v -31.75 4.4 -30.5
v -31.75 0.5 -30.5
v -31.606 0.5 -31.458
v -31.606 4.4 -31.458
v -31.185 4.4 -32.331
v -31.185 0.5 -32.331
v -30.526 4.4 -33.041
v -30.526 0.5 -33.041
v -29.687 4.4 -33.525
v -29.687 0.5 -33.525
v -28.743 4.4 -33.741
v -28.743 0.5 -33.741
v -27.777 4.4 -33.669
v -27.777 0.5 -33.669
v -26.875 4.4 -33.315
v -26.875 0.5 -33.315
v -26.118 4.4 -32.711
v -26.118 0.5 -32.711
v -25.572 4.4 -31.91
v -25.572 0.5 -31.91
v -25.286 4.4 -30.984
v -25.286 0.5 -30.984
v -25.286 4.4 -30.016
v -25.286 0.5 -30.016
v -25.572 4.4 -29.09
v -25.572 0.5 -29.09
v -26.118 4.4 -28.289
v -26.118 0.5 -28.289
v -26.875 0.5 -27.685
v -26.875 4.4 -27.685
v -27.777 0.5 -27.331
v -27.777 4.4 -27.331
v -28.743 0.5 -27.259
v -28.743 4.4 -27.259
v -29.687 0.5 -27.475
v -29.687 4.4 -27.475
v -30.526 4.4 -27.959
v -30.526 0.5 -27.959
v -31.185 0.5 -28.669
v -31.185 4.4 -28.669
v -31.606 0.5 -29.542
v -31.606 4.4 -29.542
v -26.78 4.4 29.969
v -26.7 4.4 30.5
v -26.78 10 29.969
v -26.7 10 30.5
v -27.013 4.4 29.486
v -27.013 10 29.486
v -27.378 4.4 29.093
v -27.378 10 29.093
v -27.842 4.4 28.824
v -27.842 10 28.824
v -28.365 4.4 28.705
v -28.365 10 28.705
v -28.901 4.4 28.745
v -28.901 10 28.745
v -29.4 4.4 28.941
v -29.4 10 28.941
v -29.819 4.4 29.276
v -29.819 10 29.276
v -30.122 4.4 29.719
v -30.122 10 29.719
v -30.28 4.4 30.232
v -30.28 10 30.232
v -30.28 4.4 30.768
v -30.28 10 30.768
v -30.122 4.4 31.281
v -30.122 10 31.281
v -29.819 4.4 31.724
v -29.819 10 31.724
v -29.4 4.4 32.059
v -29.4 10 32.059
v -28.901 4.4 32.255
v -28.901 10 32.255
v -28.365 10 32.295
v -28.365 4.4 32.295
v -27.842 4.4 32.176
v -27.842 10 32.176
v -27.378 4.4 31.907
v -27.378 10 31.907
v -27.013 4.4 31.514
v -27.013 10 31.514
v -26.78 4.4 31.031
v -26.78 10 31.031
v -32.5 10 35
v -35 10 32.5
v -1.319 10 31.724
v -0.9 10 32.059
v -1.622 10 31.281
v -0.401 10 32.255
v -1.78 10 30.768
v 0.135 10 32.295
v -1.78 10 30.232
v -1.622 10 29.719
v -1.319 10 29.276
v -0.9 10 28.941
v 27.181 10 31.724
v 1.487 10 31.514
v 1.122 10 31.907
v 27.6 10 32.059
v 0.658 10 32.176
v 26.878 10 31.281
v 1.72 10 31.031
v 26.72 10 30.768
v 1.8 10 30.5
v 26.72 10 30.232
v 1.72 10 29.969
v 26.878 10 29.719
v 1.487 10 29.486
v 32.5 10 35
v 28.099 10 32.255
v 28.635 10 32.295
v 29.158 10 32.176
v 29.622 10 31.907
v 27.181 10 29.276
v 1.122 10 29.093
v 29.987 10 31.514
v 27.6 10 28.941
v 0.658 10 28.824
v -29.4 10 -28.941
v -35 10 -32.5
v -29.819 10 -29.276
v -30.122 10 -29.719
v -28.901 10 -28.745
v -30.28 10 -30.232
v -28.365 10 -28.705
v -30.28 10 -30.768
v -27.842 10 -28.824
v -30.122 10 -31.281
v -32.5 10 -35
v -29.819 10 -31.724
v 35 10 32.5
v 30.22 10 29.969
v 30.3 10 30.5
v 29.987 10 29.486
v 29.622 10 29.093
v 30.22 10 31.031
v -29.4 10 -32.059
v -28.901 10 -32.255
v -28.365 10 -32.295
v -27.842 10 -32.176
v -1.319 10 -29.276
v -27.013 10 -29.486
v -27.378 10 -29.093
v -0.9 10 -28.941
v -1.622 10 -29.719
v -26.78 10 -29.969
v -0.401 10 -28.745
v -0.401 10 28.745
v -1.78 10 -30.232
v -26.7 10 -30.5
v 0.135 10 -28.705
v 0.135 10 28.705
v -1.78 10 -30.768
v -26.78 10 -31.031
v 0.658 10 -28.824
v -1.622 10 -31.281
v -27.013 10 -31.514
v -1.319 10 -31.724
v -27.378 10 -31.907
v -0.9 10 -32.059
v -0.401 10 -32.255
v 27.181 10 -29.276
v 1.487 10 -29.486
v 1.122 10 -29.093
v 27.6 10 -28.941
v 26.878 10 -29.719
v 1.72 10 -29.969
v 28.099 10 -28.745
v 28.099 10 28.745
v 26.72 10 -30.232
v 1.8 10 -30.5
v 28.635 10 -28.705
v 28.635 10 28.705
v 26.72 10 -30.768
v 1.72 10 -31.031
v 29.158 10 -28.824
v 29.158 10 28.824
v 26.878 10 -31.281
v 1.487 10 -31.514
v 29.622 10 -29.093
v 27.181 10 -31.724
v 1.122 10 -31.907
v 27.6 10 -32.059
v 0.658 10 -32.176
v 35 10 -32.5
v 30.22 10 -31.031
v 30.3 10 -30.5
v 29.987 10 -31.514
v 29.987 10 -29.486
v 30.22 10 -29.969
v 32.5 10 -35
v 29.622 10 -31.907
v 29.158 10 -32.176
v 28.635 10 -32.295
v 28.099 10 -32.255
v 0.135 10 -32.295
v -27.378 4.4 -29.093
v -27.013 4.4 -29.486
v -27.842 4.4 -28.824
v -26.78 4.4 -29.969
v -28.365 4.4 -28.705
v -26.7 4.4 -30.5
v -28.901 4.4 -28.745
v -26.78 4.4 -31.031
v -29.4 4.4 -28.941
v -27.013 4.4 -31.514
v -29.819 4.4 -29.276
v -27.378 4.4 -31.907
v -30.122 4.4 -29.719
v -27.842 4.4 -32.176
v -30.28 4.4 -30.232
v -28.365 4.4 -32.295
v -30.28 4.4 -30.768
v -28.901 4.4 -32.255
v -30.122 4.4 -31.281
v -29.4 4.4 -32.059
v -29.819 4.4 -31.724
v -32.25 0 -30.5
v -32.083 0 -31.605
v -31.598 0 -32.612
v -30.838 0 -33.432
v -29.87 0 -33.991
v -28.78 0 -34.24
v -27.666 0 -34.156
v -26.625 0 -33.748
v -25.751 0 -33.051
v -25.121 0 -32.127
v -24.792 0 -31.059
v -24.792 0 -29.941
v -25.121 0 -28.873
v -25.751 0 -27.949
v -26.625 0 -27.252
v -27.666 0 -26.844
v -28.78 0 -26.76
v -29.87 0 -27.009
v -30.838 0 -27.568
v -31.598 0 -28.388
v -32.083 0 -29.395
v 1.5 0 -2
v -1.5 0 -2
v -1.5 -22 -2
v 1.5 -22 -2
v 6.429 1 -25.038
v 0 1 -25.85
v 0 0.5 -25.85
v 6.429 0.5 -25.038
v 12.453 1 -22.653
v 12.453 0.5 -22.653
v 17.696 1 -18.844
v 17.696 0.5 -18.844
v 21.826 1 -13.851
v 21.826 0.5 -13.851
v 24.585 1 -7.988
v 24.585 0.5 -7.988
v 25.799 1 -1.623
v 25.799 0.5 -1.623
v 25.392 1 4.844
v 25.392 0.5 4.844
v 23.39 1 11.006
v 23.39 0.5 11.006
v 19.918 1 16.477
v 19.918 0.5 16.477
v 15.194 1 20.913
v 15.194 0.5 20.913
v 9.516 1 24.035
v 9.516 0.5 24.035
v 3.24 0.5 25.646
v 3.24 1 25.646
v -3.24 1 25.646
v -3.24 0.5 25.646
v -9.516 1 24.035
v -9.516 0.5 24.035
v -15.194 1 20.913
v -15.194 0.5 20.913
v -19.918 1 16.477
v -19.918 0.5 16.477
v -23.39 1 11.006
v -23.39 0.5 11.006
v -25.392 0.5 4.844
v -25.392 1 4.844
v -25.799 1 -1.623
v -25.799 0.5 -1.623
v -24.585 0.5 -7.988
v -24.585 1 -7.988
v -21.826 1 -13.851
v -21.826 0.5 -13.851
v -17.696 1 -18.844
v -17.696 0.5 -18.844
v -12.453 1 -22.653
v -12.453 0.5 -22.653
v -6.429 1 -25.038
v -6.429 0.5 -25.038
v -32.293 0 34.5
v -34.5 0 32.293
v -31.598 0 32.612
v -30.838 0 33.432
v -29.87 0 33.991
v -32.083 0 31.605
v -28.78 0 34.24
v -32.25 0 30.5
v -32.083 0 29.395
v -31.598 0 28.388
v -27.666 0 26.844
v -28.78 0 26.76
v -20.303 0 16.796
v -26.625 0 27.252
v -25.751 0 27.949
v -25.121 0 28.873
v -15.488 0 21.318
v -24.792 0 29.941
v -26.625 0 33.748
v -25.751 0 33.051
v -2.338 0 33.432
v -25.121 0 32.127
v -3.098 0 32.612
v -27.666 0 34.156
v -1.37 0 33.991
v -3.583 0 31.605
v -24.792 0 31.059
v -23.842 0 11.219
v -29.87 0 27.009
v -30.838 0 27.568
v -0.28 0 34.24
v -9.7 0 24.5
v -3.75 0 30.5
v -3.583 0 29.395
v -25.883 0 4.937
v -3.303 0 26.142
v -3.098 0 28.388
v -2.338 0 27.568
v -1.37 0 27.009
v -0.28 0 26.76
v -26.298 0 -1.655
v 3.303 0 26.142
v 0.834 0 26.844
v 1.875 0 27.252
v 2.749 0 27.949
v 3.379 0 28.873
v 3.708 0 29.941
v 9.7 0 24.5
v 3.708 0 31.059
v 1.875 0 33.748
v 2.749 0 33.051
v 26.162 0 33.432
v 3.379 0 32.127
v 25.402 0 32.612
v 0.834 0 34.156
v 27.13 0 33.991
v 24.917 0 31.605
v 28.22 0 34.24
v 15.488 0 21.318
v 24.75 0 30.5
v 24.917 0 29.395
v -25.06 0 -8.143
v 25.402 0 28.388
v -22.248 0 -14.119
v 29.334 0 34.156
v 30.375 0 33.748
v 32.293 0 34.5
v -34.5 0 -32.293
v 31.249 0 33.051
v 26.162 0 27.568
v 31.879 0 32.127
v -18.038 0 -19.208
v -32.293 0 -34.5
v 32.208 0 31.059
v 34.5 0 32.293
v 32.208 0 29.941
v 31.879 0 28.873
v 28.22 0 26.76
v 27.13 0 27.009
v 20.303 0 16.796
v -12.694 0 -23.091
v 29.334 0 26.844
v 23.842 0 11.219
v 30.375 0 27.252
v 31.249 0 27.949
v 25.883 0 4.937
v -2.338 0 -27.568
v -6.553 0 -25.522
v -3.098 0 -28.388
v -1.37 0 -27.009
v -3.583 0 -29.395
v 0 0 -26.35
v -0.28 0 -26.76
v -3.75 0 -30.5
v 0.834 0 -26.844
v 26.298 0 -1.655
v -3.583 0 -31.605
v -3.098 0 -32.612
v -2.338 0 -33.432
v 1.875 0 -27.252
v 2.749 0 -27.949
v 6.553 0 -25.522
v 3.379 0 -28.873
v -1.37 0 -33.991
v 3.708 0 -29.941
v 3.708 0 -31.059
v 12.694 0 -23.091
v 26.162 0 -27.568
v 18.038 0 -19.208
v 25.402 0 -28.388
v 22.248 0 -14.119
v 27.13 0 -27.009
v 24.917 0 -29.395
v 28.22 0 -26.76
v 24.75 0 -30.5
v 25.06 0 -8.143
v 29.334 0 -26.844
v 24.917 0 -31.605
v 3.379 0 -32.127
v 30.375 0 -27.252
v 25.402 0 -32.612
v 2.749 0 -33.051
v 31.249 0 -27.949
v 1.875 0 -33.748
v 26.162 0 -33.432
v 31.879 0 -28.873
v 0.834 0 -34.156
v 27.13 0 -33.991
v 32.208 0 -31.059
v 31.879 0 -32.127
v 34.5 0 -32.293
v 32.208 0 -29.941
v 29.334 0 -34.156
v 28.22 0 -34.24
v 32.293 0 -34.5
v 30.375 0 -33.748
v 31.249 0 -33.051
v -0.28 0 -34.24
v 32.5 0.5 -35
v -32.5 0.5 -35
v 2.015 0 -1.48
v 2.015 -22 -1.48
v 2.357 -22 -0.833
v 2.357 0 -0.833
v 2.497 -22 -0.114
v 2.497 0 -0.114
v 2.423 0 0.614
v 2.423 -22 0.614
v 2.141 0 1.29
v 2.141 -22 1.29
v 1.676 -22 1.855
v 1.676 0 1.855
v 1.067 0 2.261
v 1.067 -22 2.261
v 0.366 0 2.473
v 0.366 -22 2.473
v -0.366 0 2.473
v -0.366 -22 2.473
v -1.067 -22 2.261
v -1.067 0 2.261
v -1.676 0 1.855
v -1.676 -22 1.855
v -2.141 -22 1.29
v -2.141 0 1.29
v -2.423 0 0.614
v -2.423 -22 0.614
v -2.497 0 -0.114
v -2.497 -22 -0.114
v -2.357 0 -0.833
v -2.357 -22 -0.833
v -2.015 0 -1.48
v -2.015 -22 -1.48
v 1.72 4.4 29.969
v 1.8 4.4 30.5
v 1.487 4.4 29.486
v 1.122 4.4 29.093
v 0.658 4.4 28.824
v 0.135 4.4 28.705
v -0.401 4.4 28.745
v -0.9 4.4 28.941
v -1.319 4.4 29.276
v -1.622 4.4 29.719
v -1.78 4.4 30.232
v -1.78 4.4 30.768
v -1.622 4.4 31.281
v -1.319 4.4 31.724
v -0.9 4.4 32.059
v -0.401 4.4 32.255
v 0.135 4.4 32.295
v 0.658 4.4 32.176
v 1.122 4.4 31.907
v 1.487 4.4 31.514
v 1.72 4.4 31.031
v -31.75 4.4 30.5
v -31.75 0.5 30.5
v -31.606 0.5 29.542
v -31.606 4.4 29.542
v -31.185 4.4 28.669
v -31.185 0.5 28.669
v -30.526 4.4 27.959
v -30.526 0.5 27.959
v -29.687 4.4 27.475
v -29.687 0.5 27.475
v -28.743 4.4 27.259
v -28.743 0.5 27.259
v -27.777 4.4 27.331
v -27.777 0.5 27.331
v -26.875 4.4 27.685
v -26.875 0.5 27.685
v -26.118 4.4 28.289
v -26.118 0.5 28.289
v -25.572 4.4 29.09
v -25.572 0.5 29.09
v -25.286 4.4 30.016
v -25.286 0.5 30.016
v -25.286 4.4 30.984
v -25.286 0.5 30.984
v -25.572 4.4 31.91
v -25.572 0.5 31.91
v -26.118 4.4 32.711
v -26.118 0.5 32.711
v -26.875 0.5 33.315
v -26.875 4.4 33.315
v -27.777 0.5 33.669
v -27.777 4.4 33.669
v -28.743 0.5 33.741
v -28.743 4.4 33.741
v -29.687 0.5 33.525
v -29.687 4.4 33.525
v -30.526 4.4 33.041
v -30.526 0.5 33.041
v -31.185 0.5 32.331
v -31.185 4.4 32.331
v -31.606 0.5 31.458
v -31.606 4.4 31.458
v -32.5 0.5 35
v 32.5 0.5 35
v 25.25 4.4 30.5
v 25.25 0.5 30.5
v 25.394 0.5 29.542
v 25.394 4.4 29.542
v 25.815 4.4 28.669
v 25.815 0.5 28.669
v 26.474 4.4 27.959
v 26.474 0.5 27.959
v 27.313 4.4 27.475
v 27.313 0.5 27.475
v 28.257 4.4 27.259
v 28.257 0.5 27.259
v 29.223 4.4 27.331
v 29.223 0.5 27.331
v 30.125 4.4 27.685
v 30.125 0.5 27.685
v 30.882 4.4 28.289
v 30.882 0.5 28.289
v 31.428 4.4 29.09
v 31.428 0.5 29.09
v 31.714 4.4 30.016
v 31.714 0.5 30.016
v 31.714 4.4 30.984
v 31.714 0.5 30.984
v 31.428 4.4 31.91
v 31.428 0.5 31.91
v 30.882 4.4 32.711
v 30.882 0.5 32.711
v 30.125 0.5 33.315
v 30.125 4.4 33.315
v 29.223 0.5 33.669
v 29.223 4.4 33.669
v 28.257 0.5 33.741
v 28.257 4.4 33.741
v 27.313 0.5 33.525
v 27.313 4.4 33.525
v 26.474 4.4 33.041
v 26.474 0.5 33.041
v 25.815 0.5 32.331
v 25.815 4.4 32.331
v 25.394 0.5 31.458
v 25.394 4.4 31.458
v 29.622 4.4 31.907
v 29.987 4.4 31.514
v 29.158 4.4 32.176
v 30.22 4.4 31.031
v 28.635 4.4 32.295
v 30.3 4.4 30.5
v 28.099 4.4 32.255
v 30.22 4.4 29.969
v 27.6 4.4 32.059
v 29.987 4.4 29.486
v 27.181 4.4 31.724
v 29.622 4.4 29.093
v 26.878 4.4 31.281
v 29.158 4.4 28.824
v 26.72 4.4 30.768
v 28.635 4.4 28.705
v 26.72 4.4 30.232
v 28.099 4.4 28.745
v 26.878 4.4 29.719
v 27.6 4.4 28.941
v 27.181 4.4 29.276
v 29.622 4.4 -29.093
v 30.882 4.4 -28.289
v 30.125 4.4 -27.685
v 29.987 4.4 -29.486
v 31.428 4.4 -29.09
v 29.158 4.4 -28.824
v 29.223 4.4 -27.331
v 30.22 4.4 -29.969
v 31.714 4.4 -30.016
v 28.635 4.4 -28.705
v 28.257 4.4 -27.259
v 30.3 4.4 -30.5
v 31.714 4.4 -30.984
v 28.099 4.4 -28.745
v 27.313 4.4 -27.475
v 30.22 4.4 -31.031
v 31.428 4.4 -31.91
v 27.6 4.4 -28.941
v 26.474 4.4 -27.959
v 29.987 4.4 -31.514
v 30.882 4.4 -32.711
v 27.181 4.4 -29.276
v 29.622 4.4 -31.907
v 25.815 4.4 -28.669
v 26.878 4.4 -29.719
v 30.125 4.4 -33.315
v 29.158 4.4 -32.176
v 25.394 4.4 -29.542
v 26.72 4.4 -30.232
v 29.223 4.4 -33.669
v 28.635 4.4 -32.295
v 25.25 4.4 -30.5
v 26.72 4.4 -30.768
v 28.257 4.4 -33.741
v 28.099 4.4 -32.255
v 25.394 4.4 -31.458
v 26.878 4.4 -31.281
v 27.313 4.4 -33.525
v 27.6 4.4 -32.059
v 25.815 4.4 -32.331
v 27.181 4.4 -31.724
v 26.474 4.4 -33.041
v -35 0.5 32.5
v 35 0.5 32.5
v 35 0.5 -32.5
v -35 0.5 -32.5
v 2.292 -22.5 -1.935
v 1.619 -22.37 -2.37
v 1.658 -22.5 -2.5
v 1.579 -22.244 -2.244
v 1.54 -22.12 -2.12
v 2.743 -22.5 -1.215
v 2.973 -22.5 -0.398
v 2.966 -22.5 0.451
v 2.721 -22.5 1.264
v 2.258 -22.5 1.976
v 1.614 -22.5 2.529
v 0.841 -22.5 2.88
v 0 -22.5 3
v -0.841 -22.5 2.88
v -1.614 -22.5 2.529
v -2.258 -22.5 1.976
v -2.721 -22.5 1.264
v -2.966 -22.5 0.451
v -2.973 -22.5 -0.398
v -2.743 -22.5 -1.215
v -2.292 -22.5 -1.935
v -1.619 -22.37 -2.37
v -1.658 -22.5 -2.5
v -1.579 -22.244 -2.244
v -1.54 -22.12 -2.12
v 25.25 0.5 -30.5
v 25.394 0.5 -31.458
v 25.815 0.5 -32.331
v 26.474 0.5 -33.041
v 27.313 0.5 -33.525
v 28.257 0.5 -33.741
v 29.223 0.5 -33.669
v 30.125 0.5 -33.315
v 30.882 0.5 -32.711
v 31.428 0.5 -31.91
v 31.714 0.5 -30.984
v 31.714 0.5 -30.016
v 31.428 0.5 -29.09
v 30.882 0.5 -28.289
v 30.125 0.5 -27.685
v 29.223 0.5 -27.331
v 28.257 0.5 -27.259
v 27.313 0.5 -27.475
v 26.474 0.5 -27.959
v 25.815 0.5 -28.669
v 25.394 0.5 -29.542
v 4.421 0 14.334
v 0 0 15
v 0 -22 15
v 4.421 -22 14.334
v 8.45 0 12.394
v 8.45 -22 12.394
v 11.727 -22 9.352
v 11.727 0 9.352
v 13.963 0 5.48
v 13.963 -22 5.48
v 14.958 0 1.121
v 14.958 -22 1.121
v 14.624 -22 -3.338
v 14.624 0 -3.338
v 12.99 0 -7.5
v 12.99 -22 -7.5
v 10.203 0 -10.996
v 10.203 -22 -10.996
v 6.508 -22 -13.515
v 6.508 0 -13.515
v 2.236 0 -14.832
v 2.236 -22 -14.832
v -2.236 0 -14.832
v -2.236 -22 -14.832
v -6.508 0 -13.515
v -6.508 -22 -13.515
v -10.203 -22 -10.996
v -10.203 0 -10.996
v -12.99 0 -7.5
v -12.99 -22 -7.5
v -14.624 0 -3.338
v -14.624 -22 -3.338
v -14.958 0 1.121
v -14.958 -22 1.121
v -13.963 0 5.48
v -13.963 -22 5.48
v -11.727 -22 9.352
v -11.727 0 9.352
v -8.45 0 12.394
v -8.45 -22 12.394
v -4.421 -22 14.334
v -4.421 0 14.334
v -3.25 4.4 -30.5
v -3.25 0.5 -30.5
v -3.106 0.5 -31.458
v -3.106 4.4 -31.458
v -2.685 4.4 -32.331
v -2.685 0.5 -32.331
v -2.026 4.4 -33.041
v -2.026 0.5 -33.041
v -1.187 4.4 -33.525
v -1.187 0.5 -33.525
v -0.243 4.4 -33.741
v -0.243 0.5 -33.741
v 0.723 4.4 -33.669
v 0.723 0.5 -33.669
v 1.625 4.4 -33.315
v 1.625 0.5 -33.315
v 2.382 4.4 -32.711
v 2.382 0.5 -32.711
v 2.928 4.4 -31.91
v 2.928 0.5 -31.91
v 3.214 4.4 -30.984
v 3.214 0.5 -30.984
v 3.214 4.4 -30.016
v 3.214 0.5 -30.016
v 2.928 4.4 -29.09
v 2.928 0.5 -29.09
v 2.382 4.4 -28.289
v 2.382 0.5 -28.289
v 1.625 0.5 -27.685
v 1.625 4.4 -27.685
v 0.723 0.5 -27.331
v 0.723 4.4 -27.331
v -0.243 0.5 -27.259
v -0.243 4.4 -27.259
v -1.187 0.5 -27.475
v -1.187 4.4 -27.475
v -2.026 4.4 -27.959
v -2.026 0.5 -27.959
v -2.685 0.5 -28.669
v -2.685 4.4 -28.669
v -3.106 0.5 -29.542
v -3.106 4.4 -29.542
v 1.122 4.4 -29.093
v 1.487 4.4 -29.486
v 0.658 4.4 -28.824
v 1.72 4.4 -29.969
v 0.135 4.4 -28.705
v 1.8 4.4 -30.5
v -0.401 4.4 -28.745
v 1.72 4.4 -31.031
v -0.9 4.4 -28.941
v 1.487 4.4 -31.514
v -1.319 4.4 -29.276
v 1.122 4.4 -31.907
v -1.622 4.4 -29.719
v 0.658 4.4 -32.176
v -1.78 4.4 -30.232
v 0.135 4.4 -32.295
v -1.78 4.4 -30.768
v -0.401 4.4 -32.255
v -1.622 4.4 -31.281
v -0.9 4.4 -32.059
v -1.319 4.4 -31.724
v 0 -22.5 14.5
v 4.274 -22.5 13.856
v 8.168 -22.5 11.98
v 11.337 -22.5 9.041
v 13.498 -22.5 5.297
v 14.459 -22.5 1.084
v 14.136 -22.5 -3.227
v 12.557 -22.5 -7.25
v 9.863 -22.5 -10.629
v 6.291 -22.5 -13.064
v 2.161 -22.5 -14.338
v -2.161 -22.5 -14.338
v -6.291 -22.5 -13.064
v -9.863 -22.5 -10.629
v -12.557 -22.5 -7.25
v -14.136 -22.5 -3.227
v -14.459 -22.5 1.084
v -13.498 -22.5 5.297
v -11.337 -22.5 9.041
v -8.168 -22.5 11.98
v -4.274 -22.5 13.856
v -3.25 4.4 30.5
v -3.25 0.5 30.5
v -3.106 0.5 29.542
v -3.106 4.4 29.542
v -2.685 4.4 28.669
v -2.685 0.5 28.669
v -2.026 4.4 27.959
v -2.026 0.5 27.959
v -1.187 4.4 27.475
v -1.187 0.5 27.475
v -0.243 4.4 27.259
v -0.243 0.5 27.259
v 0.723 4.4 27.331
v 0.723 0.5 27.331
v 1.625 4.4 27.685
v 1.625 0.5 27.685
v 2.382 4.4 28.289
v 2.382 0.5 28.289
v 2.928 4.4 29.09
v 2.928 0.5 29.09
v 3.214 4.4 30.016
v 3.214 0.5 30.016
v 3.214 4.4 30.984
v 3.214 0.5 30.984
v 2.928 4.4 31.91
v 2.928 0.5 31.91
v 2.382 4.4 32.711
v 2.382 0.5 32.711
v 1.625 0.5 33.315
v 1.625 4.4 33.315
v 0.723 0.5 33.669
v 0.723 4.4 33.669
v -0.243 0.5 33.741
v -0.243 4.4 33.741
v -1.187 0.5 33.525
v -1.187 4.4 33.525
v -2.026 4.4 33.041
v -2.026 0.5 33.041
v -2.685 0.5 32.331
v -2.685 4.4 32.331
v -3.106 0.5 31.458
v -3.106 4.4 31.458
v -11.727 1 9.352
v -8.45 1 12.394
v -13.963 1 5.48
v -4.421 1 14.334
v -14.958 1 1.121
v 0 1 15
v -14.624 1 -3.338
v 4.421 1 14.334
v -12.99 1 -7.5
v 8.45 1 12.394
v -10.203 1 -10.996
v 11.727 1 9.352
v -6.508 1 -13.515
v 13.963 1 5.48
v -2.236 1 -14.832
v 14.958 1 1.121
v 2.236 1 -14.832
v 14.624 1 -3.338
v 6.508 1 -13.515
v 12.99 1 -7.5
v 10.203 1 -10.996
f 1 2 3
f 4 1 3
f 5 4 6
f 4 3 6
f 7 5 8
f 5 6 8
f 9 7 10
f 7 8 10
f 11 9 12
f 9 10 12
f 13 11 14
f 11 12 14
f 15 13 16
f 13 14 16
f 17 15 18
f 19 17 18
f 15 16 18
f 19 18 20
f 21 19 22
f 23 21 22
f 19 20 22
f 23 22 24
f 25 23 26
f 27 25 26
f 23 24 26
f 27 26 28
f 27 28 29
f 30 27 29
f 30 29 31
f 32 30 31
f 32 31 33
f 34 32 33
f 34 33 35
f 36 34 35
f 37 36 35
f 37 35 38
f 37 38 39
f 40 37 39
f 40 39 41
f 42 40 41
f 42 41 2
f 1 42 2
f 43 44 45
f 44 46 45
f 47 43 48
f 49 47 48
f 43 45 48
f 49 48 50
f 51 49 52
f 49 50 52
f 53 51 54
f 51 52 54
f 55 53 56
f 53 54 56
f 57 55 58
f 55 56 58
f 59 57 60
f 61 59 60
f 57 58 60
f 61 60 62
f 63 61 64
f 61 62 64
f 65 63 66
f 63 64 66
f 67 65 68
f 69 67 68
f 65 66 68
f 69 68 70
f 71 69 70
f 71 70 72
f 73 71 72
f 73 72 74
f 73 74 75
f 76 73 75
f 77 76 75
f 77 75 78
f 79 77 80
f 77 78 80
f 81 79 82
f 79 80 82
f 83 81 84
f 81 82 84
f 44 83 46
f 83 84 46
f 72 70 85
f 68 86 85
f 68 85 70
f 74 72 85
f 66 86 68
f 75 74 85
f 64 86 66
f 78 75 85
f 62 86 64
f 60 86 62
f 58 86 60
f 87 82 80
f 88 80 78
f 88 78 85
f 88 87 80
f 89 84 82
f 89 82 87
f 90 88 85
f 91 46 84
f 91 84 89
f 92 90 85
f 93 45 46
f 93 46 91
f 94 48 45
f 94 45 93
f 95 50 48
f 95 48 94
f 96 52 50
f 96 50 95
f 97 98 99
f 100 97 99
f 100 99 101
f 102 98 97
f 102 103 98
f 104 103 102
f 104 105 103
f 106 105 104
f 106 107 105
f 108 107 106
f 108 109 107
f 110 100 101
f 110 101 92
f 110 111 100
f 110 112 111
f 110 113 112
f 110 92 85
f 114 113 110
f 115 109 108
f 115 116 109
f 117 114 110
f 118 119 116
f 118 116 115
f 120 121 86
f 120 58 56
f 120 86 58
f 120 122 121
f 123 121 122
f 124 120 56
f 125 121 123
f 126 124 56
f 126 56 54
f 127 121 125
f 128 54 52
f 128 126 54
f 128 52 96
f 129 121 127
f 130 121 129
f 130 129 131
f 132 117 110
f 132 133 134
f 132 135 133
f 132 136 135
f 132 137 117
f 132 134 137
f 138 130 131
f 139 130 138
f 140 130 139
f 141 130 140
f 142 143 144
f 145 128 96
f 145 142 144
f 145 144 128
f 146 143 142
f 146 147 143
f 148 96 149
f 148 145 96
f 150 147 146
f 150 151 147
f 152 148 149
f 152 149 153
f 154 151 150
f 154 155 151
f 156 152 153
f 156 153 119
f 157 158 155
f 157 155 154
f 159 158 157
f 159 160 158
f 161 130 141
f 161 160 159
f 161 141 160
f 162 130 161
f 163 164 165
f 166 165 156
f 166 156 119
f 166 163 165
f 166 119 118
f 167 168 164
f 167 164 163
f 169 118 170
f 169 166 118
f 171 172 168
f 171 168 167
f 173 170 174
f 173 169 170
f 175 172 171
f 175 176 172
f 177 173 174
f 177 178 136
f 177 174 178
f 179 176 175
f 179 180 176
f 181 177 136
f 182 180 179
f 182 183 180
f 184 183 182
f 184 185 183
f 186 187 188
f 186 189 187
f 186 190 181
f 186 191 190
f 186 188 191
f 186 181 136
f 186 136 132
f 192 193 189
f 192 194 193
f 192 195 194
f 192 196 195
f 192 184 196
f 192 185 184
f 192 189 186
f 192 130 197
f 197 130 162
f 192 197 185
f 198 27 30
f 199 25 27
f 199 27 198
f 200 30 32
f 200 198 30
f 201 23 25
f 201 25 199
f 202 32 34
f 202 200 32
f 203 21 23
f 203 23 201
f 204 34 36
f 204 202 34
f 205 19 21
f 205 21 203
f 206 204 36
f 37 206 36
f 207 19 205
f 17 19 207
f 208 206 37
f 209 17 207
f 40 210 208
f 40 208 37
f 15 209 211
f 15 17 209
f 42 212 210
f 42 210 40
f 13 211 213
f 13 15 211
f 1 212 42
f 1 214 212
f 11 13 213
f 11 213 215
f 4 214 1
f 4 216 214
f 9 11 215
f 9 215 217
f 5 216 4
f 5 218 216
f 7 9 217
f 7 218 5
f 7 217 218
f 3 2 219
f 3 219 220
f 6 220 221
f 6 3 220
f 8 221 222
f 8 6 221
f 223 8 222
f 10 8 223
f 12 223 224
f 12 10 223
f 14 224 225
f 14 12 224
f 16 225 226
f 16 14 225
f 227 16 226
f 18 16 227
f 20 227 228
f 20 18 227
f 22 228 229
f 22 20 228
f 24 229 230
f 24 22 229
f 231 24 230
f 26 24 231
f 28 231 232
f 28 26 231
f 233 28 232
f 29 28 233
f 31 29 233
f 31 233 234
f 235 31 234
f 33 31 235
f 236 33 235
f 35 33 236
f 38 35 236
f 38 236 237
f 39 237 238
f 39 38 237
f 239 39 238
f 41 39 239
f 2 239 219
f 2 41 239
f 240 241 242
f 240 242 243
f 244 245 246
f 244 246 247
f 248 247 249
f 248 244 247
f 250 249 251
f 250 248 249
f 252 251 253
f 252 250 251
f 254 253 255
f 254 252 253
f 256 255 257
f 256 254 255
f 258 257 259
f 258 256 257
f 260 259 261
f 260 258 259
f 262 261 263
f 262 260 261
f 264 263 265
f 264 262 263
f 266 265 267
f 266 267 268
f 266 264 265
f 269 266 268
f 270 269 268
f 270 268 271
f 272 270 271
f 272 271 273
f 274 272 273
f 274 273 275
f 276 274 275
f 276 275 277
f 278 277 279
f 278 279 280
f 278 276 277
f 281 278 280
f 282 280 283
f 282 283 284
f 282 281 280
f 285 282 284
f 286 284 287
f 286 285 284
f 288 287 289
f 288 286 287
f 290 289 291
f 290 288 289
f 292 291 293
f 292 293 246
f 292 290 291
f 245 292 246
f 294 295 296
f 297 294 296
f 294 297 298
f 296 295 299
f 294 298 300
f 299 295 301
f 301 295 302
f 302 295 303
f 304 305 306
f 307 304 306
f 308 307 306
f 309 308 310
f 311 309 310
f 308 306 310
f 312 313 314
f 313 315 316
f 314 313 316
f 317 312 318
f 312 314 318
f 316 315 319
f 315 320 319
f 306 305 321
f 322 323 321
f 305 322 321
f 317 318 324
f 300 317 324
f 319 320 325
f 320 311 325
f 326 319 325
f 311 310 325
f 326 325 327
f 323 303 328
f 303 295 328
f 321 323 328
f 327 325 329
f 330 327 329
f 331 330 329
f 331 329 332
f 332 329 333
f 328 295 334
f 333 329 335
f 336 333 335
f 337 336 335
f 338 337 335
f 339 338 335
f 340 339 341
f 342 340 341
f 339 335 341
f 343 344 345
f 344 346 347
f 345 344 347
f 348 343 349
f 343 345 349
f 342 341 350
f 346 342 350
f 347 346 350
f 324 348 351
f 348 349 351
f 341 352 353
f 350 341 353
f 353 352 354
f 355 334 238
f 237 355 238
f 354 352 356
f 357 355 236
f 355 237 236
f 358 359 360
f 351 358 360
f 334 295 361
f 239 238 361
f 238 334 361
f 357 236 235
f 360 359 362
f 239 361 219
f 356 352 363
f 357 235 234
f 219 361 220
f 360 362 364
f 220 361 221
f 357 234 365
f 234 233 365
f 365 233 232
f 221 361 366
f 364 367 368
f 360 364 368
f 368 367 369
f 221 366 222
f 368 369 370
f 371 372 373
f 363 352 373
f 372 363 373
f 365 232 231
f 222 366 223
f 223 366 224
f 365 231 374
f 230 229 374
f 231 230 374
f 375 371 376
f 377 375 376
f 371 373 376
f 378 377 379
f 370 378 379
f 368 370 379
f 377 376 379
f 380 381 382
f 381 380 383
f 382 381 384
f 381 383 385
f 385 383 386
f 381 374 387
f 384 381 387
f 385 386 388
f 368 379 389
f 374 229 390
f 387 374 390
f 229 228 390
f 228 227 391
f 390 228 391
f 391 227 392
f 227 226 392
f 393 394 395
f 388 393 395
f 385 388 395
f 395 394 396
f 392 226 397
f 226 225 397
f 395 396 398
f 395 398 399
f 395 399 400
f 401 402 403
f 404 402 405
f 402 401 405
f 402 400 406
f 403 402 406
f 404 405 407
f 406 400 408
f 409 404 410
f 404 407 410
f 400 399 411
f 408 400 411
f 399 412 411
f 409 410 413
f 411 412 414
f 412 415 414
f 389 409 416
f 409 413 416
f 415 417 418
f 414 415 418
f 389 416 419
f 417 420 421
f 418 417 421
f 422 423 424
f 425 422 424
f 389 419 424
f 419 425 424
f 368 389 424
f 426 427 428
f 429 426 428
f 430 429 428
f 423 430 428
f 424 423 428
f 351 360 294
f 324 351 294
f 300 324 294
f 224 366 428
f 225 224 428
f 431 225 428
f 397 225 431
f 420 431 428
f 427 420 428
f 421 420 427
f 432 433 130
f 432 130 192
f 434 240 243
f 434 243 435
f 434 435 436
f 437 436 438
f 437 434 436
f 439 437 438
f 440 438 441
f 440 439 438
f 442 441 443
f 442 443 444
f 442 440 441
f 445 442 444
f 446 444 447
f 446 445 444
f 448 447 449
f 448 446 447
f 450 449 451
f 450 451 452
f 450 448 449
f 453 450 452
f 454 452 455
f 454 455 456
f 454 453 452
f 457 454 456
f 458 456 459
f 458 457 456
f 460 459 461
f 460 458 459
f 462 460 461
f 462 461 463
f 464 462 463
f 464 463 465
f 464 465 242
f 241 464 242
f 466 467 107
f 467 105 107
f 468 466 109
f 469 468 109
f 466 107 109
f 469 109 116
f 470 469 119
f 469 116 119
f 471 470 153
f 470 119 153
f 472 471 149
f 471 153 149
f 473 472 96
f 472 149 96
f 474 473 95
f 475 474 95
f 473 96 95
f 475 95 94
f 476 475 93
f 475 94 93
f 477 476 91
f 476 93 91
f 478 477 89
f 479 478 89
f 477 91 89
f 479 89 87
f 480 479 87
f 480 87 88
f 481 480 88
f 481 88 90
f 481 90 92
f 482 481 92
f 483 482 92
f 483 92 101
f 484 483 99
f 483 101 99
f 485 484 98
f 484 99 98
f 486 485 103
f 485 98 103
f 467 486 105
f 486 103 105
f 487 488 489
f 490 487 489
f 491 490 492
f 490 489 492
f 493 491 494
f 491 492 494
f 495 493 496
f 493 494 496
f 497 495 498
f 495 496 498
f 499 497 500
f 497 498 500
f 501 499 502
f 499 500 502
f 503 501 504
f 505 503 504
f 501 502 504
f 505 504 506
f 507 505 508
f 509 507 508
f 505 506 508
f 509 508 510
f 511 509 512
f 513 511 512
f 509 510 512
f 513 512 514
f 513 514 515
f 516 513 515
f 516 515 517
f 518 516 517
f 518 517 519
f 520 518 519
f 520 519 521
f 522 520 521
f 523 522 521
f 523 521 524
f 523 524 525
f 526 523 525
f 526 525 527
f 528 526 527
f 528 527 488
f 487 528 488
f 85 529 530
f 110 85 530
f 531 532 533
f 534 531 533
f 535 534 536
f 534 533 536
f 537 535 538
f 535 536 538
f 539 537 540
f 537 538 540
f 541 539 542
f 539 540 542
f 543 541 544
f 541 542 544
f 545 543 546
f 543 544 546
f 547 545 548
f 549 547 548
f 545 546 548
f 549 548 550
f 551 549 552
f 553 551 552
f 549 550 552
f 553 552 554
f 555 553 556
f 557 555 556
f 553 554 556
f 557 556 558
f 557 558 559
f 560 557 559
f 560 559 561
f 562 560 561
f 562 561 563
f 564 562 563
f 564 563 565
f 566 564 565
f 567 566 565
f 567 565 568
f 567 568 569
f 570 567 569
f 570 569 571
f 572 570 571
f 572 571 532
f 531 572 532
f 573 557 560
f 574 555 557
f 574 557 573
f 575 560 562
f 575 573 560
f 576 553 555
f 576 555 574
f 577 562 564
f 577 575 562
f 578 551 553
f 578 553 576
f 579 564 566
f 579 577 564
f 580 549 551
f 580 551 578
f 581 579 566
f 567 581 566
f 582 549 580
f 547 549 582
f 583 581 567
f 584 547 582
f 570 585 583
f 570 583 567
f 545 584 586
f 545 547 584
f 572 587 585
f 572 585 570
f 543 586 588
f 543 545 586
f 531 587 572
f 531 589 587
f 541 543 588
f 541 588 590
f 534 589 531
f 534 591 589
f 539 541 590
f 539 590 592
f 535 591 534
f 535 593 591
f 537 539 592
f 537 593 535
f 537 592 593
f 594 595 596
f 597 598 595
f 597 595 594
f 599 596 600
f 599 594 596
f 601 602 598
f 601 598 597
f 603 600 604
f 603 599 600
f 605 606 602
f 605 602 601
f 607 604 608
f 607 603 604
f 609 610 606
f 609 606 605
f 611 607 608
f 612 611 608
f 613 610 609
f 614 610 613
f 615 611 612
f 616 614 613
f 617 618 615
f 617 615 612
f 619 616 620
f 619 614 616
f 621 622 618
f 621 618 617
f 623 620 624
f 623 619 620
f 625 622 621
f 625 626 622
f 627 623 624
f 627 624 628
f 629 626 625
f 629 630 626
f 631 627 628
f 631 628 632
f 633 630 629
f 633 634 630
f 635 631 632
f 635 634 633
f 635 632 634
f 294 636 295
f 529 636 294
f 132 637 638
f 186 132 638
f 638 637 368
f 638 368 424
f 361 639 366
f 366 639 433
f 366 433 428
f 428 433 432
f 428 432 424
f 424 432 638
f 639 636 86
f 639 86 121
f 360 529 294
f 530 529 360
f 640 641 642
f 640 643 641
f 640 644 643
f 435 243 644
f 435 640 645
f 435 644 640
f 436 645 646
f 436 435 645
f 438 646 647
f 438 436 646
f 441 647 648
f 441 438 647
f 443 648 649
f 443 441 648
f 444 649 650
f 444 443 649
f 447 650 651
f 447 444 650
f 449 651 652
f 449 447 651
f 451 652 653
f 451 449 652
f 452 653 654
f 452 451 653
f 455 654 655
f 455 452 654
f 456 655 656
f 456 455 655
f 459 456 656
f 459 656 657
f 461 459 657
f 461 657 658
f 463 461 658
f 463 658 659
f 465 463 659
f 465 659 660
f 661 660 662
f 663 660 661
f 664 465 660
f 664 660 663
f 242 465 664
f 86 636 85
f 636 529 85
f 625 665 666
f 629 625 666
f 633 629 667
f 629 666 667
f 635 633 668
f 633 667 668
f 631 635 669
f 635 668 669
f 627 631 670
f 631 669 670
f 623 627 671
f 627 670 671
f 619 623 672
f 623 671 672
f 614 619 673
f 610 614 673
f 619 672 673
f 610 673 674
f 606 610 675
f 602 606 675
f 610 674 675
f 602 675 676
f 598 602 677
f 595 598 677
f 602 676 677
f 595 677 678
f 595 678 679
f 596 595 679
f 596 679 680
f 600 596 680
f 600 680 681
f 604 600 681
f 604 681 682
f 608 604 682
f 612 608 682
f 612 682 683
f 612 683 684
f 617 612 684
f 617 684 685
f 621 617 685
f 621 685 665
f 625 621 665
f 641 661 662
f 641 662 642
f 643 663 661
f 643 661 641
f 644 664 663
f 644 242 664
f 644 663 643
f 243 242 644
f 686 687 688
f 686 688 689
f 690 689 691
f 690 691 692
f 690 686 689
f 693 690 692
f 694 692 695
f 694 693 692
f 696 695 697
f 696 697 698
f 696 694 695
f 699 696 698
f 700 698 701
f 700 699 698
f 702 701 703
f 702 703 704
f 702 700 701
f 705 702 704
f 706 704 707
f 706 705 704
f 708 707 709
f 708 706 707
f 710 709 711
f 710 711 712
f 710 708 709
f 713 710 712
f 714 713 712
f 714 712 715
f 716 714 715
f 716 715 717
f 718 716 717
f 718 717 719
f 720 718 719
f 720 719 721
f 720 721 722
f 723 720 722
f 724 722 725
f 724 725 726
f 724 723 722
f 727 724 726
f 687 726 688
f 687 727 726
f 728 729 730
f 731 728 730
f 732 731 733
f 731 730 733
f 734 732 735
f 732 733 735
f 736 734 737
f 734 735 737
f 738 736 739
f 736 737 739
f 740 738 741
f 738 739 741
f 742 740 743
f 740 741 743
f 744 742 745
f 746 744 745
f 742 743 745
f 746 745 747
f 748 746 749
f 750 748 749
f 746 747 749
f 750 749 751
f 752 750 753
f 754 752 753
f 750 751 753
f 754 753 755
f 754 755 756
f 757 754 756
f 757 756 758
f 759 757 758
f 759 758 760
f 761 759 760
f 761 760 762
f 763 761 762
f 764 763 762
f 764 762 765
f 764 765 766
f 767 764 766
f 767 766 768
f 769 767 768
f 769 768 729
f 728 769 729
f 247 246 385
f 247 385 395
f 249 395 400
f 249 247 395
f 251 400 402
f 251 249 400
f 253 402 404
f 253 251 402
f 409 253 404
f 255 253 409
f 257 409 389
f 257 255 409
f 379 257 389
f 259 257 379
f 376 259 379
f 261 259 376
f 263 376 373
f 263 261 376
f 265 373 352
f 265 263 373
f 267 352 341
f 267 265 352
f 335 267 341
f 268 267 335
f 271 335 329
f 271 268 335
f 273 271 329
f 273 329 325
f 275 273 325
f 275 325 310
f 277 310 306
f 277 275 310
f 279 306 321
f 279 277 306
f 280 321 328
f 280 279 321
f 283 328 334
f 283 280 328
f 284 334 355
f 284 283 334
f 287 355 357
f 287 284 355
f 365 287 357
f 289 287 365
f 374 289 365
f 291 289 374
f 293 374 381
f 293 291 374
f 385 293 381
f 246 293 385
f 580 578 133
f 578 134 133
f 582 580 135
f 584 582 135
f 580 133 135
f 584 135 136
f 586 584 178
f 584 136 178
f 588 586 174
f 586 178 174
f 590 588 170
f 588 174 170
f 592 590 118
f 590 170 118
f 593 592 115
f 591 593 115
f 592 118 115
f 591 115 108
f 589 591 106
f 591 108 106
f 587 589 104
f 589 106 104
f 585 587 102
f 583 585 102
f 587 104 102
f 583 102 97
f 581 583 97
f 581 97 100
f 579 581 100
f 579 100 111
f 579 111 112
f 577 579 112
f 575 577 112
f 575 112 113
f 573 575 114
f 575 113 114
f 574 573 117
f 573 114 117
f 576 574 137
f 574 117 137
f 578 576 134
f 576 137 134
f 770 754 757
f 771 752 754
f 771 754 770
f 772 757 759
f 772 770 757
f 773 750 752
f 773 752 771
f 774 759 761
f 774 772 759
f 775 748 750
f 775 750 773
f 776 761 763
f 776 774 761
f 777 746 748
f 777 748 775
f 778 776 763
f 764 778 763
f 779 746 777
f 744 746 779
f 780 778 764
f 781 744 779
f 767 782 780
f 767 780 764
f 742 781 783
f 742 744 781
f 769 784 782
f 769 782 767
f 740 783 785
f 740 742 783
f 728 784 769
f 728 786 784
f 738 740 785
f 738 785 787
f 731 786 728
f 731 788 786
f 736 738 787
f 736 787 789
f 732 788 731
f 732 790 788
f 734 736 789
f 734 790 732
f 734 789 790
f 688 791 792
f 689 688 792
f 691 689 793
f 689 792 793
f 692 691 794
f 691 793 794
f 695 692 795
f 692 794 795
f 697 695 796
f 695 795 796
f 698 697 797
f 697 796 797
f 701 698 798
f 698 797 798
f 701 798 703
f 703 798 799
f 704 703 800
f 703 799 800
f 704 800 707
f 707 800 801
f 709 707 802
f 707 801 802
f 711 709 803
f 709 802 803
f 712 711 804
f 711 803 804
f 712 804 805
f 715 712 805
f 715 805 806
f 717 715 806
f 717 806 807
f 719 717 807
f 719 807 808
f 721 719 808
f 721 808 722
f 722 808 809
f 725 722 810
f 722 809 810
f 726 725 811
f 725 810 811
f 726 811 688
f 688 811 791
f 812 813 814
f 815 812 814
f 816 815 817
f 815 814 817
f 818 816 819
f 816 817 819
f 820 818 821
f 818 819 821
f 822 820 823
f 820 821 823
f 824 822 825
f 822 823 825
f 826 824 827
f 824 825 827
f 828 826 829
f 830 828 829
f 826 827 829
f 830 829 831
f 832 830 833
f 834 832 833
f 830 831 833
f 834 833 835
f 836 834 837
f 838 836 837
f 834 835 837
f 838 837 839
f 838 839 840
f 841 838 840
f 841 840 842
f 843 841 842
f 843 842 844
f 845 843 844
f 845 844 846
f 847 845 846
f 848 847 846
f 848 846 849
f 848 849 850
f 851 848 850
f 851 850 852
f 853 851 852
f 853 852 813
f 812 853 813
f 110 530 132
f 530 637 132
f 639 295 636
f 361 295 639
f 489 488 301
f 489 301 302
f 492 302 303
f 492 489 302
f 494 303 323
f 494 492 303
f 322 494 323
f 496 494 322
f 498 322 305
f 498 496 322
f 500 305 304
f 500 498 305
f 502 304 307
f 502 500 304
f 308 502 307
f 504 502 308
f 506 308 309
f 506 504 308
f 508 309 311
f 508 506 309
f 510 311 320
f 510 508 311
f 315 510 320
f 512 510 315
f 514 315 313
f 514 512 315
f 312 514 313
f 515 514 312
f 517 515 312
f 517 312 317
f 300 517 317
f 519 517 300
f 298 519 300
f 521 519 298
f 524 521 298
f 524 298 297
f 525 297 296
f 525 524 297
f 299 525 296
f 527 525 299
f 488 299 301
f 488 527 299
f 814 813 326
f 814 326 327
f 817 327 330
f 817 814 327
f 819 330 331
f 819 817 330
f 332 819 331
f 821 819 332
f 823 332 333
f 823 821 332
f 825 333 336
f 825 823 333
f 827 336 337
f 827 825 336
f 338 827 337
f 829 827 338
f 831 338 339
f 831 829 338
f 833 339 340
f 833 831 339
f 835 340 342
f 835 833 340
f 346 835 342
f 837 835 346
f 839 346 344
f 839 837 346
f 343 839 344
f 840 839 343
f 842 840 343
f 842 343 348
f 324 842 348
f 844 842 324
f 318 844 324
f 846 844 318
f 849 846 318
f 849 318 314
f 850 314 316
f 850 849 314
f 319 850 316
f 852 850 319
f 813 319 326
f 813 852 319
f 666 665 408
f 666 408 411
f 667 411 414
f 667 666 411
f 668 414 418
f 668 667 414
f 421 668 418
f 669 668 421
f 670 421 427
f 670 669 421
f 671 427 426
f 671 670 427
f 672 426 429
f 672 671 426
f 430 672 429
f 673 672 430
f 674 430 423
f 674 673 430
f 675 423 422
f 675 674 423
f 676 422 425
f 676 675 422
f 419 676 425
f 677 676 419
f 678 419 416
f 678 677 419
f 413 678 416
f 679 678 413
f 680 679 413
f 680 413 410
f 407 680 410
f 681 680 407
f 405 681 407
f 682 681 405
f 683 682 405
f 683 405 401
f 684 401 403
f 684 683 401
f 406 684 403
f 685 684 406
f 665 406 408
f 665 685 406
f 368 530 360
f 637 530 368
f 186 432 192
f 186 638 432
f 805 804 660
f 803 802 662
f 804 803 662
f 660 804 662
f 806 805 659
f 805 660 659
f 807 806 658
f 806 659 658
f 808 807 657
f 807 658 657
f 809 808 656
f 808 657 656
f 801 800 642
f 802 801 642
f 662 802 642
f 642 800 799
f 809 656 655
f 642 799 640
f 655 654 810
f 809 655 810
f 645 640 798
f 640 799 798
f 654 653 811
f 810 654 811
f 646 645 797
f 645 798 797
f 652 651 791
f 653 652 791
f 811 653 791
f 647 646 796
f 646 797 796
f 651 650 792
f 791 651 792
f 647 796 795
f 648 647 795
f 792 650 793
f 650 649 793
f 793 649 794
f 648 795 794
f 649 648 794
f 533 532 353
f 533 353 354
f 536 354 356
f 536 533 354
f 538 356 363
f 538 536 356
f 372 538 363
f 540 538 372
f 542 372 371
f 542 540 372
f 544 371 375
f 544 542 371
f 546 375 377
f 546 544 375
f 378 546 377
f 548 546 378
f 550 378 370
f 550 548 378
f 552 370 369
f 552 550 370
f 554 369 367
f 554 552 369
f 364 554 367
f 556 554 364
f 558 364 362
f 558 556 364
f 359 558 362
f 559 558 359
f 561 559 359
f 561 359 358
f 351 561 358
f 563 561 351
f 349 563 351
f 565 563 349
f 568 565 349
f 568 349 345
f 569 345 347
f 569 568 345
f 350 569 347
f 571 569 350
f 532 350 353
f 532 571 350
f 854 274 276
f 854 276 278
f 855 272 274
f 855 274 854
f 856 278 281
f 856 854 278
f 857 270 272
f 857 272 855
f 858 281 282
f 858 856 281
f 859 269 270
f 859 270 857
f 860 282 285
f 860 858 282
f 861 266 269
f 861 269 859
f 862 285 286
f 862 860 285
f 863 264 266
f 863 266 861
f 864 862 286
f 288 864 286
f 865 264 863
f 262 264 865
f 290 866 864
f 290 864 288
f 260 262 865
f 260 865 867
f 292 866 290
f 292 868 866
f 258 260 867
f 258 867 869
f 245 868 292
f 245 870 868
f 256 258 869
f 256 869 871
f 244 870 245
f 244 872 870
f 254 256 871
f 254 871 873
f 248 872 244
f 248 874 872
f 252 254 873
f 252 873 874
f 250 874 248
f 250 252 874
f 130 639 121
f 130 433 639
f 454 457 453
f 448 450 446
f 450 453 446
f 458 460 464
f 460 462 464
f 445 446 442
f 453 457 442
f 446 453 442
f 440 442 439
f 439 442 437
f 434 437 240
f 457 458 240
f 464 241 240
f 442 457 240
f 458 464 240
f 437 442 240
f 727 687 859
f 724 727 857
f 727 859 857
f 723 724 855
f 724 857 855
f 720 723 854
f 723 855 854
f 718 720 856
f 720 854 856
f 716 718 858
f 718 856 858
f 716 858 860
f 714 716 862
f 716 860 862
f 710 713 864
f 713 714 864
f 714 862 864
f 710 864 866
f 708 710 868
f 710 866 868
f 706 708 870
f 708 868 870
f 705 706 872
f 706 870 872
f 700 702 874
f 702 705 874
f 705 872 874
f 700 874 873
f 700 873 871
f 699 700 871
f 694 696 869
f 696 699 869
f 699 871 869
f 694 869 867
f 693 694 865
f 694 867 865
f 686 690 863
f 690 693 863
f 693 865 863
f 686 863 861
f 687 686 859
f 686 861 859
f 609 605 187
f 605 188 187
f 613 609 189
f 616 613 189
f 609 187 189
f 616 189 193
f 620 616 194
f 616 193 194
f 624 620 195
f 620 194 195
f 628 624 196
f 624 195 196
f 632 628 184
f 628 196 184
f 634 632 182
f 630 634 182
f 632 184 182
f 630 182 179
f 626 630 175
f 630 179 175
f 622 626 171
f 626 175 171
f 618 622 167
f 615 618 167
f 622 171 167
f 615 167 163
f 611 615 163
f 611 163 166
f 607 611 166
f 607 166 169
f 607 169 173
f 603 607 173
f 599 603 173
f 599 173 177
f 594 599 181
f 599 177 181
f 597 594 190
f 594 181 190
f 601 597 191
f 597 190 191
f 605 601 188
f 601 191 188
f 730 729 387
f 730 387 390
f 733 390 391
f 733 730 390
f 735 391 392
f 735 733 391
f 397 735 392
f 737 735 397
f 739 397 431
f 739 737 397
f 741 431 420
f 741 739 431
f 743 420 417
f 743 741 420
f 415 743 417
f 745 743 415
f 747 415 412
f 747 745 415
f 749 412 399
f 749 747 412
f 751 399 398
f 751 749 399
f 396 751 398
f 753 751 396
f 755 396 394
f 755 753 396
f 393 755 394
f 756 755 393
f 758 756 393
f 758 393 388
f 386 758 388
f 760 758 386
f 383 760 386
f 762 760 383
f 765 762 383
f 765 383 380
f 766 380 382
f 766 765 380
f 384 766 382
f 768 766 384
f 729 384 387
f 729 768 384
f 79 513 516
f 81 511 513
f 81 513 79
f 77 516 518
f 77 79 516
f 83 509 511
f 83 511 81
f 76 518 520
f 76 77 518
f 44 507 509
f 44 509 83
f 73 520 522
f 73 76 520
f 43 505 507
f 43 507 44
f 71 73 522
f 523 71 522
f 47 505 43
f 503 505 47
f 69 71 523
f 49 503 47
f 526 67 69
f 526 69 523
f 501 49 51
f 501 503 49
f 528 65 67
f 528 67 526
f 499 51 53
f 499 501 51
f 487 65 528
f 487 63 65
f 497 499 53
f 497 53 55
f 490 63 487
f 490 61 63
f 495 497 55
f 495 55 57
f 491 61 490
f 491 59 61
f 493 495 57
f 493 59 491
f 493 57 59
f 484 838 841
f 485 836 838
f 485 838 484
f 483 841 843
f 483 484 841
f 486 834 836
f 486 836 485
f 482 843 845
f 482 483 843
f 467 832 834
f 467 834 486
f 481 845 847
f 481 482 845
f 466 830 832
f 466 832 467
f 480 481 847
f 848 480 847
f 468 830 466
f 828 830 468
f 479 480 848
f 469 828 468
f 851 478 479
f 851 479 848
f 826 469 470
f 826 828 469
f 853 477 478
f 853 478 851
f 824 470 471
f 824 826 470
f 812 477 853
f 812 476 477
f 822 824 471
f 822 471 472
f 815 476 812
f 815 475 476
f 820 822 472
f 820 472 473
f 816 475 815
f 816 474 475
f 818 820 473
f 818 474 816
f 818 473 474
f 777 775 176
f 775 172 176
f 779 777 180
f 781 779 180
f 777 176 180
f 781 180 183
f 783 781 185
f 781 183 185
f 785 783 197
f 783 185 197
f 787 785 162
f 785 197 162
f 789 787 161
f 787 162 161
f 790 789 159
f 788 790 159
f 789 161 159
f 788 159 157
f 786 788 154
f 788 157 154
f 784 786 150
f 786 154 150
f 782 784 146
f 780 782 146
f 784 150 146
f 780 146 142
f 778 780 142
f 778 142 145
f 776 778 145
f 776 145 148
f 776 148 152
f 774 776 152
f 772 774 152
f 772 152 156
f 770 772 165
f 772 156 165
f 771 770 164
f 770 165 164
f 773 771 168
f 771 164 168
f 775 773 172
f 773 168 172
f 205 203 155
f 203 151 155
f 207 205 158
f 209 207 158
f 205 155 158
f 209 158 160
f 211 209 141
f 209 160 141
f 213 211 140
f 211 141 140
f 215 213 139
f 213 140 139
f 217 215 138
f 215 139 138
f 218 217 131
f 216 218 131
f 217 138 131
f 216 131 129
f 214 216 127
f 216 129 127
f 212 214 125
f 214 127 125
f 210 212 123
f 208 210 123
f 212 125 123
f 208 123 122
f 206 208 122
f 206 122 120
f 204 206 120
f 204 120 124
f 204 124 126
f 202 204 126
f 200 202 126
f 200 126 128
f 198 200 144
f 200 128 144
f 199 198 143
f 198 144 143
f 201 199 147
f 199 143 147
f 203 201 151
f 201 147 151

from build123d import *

# Parameters (mm, degrees)
SKETCH1_W                                           = 70
SKETCH1_H                                           = 70
BOSS_EXTRUDE1_DEPTH                                 = 10
SKETCH1_3_R                                         = 15
BOSS_EXTRUDE2_DEPTH                                 = 22.5
CUT_EXTRUDE1_START                                  = -1
SKETCH2_R                                           = 25.85
SKETCH2_R_2                                         = 15
CUT_EXTRUDE1_DEPTH                                  = 1
CBORE_FOR_M3_HEX_SOCKET_HEAD_CAP_SCREW1_D           = 3.6
CBORE_FOR_M3_HEX_SOCKET_HEAD_CAP_SCREW1_CBORE_D     = 6.5
CBORE_FOR_M3_HEX_SOCKET_HEAD_CAP_SCREW1_CBORE_DEPTH = 4.4
F_2_5MM_CHAMFER1_SIZE                               = 2.5
F_0_5MM_CHAMFER2_SIZE                               = 0.5


with BuildPart() as part:
    # Sketch1 → Boss-Extrude1 (new body)
    with BuildSketch(Plane(origin=(0, 0, 0), x_dir=(1, 0, 0), z_dir=(0, 1, 0))):
        Rectangle(SKETCH1_W, SKETCH1_H)
    extrude(amount=BOSS_EXTRUDE1_DEPTH)

    # Sketch1<3> → Boss-Extrude2 (add)
    with BuildSketch(Plane(origin=(0, 0, 0), x_dir=(1, 0, 0), z_dir=(0, 1, 0))):
        with Locations(Location((0, 0, 0), (0, 0, 270))):
            Circle(SKETCH1_3_R)
        with BuildLine():
            Line((-1.5, 2), (1.5, 2))
            ThreePointArc((1.5, 2), (0, -2.5), (-1.5, 2))
        make_face(mode=Mode.SUBTRACT)
    extrude(amount=-BOSS_EXTRUDE2_DEPTH)

    # Sketch2 → Cut-Extrude1 (cut)
    with BuildSketch(Plane.XZ.offset(CUT_EXTRUDE1_START)):
        with Locations(Location((0, 0, 0), (0, 0, 270))):
            Circle(SKETCH2_R)
        with Locations(Location((0, 0, 0), (0, 0, 90))):
            Circle(SKETCH2_R_2, mode=Mode.SUBTRACT)
    extrude(amount=CUT_EXTRUDE1_DEPTH, mode=Mode.SUBTRACT)

    # CBORE for M3 Hex Socket Head Cap Screw1 (through all)
    with Locations(Plane(origin=(0, 0, 0), x_dir=(-1, 0, 0), z_dir=(0, -1, 0))):
        with Locations((-28.5, 30.5), (28.5, -30.5), (-28.5, -30.5), (28.5, 30.5), (0, -30.5), (0, 30.5)):
            CounterBoreHole(CBORE_FOR_M3_HEX_SOCKET_HEAD_CAP_SCREW1_D / 2, CBORE_FOR_M3_HEX_SOCKET_HEAD_CAP_SCREW1_CBORE_D / 2, CBORE_FOR_M3_HEX_SOCKET_HEAD_CAP_SCREW1_CBORE_DEPTH)

    # 2,5mm Chamfer1
    f_2_5mm_chamfer1_edges = [part.edges().sort_by_distance(p)[0] for p in [
        (-35, 5, -35),
        (-35, 5, 35),
        (35, 5, 35),
        (35, 5, -35),
    ]]
    chamfer(f_2_5mm_chamfer1_edges, length=F_2_5MM_CHAMFER1_SIZE)

    # 0,5mm Chamfer2
    f_0_5mm_chamfer2_edges = [part.edges().sort_by_distance(p)[0] for p in [
        (0, -22.5, -2),
        (0, -22.5, -15),
        (0, -22.5, 2.5),
        (0, 0, 25.85),
        (3.25, 0, -30.5),
        (3.25, 0, 30.5),
        (-25.25, 0, -30.5),
        (31.75, 0, 30.5),
        (-25.25, 0, 30.5),
        (31.75, 0, -30.5),
        (0, 0, 35),
        (0, 0, -35),
        (35, 0, 0),
        (-35, 0, 0),
        (33.75, 0, -33.75),
        (-33.75, 0, -33.75),
        (33.75, 0, 33.75),
        (-33.75, 0, 33.75),
    ]]
    chamfer(f_0_5mm_chamfer2_edges, length=F_0_5MM_CHAMFER2_SIZE)


solid = part.part
